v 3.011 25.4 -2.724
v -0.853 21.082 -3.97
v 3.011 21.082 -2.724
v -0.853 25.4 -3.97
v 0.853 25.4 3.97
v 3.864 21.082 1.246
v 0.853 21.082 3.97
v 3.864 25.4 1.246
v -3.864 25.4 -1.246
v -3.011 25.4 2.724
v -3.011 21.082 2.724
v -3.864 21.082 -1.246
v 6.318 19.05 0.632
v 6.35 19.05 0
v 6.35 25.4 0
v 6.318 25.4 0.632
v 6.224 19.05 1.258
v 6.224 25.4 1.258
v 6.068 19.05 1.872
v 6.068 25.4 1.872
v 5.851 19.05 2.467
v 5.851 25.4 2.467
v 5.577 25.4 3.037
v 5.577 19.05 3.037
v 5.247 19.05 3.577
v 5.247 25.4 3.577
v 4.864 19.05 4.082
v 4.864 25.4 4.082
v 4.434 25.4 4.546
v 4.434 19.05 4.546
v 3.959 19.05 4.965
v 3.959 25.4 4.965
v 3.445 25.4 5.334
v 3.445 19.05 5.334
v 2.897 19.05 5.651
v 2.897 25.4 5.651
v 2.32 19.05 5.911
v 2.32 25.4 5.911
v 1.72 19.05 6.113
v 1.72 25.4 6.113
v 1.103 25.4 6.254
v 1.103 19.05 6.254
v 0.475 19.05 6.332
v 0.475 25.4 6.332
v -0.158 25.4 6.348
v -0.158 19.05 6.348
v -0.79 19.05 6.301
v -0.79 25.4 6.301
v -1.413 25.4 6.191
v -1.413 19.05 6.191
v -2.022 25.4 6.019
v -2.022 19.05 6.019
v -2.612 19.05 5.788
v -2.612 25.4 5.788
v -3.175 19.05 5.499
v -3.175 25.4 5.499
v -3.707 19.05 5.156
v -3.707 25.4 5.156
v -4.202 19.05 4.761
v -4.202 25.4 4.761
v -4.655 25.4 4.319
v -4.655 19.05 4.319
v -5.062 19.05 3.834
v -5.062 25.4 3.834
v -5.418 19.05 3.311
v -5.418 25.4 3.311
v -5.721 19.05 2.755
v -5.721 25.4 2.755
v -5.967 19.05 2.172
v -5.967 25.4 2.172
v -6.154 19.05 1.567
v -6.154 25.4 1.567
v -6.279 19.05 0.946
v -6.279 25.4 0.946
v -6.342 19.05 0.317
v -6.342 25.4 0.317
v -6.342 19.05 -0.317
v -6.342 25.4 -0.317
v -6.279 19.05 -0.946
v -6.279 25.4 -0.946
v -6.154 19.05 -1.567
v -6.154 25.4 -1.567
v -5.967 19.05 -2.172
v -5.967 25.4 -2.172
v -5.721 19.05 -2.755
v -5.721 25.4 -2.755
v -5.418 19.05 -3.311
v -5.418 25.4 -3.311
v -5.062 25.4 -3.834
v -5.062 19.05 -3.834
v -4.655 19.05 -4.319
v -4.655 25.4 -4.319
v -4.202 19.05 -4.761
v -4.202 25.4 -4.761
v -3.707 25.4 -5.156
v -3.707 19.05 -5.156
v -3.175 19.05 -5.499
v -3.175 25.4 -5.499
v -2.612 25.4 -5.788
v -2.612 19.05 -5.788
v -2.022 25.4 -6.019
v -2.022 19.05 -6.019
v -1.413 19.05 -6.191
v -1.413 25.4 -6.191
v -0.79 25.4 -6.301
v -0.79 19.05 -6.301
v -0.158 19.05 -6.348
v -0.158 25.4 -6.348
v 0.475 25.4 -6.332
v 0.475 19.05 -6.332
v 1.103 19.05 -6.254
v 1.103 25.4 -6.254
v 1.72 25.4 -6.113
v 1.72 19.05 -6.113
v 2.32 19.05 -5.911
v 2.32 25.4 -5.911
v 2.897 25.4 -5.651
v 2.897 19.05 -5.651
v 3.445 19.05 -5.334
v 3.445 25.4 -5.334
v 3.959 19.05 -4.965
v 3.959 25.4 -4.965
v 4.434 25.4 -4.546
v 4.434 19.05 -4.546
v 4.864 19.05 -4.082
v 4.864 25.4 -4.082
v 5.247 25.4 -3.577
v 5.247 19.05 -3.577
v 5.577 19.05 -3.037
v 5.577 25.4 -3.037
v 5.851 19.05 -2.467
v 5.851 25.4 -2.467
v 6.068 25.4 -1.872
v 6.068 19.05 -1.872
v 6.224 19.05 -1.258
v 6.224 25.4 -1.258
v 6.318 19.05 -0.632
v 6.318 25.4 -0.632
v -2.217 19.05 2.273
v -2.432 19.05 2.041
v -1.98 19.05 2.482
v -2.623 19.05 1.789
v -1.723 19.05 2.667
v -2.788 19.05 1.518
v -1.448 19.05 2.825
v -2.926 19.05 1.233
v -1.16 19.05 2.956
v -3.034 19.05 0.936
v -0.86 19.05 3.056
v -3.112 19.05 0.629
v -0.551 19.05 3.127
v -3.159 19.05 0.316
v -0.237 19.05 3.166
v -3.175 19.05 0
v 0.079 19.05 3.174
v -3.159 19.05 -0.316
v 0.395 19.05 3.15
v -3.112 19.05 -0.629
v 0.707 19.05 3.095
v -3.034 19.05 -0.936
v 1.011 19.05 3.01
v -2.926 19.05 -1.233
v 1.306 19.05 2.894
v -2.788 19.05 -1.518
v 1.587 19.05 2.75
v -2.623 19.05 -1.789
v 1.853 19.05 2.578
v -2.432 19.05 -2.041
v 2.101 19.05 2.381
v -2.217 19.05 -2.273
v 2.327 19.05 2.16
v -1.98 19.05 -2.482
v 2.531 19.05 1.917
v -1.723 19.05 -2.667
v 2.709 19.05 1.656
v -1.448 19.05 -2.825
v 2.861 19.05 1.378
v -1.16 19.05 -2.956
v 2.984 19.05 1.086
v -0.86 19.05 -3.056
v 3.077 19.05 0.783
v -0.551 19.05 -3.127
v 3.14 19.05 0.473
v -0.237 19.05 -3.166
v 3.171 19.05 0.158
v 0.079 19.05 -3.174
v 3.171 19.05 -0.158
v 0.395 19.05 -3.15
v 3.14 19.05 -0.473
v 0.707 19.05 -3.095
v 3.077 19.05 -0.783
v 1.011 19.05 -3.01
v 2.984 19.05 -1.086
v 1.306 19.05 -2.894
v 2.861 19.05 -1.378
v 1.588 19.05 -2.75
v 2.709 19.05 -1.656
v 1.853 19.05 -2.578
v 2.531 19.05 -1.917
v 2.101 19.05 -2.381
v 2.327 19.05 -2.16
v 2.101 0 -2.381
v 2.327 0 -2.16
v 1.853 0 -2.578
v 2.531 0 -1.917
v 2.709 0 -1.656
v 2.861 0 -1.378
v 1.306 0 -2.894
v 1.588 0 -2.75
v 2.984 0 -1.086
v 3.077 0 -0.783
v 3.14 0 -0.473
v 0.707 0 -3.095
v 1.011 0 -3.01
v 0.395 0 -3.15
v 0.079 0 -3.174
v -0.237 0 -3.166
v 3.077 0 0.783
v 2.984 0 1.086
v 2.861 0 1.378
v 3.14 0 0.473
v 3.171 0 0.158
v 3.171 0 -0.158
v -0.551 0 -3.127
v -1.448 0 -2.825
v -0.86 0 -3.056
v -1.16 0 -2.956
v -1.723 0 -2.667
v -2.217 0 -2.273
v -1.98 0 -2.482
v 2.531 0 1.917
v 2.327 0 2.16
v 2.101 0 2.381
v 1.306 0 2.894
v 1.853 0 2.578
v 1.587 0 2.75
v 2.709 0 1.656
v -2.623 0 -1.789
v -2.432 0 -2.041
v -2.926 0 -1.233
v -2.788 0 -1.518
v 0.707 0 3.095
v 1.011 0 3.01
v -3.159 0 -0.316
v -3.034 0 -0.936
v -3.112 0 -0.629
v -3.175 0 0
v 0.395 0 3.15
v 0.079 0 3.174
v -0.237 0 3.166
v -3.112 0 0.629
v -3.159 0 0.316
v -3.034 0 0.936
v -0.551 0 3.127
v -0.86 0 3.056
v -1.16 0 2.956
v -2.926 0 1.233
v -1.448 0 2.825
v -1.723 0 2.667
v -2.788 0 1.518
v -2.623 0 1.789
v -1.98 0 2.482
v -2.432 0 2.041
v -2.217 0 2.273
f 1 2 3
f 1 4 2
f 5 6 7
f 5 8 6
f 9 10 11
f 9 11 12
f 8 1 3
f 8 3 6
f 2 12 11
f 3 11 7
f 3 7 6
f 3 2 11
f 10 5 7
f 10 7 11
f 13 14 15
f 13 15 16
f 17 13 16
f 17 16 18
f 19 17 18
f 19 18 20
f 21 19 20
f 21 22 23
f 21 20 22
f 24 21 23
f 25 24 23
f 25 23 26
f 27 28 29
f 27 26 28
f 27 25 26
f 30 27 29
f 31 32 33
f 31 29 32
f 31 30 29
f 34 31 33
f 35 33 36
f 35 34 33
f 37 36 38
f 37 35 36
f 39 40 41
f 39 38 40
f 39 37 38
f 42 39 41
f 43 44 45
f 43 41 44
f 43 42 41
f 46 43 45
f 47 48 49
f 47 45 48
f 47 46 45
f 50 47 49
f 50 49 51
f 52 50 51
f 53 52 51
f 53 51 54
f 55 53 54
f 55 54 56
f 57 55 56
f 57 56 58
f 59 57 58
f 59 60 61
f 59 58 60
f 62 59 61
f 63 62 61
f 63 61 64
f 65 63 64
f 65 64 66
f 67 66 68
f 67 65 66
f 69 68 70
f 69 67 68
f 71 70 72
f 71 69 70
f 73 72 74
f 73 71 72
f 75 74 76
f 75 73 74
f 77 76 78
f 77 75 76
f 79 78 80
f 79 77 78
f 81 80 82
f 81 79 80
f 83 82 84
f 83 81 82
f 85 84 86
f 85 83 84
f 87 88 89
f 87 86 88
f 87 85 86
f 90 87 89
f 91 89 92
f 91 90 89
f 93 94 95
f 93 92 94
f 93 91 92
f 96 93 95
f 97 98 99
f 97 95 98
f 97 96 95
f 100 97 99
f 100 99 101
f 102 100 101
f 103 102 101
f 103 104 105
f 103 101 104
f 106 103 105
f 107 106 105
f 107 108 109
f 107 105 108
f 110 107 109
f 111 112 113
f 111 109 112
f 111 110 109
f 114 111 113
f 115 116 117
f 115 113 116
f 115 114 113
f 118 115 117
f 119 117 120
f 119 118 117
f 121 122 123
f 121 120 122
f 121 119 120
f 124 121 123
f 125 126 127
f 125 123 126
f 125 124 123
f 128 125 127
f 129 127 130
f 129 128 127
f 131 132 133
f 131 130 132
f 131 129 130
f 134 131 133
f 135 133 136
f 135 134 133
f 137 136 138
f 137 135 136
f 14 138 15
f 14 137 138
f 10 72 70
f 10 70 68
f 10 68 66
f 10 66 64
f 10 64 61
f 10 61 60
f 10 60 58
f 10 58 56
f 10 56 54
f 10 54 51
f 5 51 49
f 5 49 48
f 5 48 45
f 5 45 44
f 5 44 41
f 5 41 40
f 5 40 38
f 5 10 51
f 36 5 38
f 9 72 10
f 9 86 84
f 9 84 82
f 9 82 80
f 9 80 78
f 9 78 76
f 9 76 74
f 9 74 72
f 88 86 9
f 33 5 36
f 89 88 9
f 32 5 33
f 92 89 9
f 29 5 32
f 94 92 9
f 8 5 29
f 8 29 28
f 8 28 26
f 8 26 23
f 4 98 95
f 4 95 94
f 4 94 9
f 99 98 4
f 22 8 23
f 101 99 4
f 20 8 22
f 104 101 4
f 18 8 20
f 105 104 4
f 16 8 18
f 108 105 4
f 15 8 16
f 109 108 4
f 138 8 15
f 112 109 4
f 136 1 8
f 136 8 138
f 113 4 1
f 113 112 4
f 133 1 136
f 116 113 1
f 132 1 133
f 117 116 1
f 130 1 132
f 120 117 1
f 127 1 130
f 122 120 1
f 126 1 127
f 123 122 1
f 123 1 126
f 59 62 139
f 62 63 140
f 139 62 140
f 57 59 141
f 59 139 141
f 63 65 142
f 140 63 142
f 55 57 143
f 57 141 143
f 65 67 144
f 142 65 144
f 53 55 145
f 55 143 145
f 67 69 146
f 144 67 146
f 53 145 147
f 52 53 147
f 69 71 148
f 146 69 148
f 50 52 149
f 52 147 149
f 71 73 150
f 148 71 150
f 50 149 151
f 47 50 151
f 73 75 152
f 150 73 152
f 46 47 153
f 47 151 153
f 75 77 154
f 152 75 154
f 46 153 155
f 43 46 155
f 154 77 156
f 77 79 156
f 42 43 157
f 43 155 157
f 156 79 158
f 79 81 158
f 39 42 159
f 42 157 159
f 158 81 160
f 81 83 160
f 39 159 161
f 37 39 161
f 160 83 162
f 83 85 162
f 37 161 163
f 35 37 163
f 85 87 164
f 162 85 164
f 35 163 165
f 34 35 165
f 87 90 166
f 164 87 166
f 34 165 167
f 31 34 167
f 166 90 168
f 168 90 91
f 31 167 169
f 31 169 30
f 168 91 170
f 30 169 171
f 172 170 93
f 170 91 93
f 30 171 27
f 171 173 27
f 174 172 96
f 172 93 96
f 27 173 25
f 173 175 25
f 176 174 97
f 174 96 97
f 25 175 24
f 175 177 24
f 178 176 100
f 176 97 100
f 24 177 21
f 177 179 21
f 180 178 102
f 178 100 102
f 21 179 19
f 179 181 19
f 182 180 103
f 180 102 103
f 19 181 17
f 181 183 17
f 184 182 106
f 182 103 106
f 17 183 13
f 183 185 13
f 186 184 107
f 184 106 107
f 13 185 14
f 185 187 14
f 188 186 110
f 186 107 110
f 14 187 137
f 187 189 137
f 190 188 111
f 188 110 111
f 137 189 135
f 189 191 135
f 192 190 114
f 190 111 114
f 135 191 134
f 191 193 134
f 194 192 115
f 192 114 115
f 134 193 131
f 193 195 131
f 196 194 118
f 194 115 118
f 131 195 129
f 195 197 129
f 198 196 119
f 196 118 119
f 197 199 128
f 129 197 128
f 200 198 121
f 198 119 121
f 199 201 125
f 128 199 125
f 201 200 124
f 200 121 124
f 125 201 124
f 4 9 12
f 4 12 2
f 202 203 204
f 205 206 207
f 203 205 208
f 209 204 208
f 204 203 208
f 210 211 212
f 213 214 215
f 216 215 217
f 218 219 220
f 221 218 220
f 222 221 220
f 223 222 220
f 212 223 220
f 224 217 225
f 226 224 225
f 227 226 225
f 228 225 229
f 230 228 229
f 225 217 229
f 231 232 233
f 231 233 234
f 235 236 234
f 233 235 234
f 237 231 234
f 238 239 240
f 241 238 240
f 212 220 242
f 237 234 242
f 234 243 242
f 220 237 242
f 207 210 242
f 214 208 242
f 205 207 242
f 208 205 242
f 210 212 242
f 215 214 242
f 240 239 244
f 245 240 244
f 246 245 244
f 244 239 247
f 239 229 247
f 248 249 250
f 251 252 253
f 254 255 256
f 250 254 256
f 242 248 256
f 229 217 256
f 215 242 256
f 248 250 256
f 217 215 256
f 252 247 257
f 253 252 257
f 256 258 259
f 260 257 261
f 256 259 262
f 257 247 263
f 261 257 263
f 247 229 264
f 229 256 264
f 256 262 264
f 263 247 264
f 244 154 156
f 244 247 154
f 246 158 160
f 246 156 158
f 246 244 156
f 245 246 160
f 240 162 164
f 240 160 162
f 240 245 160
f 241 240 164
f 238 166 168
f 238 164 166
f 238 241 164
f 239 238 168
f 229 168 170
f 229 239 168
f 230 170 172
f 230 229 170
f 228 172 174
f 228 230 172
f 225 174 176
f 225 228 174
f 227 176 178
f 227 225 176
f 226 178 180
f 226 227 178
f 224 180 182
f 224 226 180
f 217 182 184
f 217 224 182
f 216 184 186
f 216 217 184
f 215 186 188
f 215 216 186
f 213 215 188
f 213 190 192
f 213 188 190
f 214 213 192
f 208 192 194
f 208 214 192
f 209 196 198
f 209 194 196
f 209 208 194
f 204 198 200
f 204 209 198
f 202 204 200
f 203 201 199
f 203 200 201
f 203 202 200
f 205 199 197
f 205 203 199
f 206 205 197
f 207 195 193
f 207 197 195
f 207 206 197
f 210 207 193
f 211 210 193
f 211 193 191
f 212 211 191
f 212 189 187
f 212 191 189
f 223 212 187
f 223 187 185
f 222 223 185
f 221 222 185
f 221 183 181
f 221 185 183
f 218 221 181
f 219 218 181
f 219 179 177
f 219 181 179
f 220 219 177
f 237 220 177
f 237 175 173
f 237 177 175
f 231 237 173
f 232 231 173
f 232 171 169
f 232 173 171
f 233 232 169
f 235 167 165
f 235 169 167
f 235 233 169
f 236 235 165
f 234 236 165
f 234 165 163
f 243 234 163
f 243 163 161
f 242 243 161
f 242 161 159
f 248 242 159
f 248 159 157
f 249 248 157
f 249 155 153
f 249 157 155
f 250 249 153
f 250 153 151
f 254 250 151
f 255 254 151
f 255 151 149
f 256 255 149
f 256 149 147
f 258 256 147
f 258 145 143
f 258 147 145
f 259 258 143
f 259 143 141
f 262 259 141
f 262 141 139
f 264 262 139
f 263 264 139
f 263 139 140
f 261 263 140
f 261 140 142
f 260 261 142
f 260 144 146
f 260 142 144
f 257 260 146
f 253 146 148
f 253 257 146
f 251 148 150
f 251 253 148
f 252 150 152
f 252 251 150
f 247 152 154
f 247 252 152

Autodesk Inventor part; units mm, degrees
ref_plane "YZ Plane" through (0, 0, 0) normal (1, 0, 0) x (0, 1, 0)
ref_plane "XZ Plane" through (0, 0, 0) normal (0, 1, 0) x (-1, 0, 0)
ref_plane "XY Plane" through (0, 0, 0) normal (0, 0, 1) x (1, 0, 0)
sketch "Sketch1" plane through (0, 0, 0) normal (0, 1, 0) x (-1, 0, 0)
  circle A0 centre (0, 0) radius 3.175
  dimension "d2" = 6.35
extrude "Extrusion1" add sketch "Sketch1" along normal blind 19.05
thread "Thread1" size "1/4-20 UNC" class "2A" standard "ANSI Unified Screw Threads" full length
sketch "Sketch2" plane through (0, 19.05, 0) normal (0, 1, 0) x (1, 0, 0)
  circle A0 centre (0, 0) radius 6.35
  dimension "d7" = 12.7
extrude "Extrusion2" add sketch "Sketch2" along normal blind 6.35
sketch "Sketch3" plane through (0, 25.4, 0) normal (0, 1, 0) x (1, 0, 0)
  line L0 (3.0114, 2.7237) -> (3.8645, -1.2461)
  line L1 (3.8645, -1.2461) -> (0.8531, -3.9698)
  line L2 (0.8531, -3.9698) -> (-3.0114, -2.7237)
  line L3 (-3.0114, -2.7237) -> (-3.8645, 1.2461)
  line L4 (-3.8645, 1.2461) -> (-0.8531, 3.9698)
  line L5 (-0.8531, 3.9698) -> (3.0114, 2.7237)
  point P0 (0, 0)
  point P1 (0, 0)
extrude "Extrusion3" cut sketch "Sketch3" against normal blind 4.318
properties part number "qtr20_75"
